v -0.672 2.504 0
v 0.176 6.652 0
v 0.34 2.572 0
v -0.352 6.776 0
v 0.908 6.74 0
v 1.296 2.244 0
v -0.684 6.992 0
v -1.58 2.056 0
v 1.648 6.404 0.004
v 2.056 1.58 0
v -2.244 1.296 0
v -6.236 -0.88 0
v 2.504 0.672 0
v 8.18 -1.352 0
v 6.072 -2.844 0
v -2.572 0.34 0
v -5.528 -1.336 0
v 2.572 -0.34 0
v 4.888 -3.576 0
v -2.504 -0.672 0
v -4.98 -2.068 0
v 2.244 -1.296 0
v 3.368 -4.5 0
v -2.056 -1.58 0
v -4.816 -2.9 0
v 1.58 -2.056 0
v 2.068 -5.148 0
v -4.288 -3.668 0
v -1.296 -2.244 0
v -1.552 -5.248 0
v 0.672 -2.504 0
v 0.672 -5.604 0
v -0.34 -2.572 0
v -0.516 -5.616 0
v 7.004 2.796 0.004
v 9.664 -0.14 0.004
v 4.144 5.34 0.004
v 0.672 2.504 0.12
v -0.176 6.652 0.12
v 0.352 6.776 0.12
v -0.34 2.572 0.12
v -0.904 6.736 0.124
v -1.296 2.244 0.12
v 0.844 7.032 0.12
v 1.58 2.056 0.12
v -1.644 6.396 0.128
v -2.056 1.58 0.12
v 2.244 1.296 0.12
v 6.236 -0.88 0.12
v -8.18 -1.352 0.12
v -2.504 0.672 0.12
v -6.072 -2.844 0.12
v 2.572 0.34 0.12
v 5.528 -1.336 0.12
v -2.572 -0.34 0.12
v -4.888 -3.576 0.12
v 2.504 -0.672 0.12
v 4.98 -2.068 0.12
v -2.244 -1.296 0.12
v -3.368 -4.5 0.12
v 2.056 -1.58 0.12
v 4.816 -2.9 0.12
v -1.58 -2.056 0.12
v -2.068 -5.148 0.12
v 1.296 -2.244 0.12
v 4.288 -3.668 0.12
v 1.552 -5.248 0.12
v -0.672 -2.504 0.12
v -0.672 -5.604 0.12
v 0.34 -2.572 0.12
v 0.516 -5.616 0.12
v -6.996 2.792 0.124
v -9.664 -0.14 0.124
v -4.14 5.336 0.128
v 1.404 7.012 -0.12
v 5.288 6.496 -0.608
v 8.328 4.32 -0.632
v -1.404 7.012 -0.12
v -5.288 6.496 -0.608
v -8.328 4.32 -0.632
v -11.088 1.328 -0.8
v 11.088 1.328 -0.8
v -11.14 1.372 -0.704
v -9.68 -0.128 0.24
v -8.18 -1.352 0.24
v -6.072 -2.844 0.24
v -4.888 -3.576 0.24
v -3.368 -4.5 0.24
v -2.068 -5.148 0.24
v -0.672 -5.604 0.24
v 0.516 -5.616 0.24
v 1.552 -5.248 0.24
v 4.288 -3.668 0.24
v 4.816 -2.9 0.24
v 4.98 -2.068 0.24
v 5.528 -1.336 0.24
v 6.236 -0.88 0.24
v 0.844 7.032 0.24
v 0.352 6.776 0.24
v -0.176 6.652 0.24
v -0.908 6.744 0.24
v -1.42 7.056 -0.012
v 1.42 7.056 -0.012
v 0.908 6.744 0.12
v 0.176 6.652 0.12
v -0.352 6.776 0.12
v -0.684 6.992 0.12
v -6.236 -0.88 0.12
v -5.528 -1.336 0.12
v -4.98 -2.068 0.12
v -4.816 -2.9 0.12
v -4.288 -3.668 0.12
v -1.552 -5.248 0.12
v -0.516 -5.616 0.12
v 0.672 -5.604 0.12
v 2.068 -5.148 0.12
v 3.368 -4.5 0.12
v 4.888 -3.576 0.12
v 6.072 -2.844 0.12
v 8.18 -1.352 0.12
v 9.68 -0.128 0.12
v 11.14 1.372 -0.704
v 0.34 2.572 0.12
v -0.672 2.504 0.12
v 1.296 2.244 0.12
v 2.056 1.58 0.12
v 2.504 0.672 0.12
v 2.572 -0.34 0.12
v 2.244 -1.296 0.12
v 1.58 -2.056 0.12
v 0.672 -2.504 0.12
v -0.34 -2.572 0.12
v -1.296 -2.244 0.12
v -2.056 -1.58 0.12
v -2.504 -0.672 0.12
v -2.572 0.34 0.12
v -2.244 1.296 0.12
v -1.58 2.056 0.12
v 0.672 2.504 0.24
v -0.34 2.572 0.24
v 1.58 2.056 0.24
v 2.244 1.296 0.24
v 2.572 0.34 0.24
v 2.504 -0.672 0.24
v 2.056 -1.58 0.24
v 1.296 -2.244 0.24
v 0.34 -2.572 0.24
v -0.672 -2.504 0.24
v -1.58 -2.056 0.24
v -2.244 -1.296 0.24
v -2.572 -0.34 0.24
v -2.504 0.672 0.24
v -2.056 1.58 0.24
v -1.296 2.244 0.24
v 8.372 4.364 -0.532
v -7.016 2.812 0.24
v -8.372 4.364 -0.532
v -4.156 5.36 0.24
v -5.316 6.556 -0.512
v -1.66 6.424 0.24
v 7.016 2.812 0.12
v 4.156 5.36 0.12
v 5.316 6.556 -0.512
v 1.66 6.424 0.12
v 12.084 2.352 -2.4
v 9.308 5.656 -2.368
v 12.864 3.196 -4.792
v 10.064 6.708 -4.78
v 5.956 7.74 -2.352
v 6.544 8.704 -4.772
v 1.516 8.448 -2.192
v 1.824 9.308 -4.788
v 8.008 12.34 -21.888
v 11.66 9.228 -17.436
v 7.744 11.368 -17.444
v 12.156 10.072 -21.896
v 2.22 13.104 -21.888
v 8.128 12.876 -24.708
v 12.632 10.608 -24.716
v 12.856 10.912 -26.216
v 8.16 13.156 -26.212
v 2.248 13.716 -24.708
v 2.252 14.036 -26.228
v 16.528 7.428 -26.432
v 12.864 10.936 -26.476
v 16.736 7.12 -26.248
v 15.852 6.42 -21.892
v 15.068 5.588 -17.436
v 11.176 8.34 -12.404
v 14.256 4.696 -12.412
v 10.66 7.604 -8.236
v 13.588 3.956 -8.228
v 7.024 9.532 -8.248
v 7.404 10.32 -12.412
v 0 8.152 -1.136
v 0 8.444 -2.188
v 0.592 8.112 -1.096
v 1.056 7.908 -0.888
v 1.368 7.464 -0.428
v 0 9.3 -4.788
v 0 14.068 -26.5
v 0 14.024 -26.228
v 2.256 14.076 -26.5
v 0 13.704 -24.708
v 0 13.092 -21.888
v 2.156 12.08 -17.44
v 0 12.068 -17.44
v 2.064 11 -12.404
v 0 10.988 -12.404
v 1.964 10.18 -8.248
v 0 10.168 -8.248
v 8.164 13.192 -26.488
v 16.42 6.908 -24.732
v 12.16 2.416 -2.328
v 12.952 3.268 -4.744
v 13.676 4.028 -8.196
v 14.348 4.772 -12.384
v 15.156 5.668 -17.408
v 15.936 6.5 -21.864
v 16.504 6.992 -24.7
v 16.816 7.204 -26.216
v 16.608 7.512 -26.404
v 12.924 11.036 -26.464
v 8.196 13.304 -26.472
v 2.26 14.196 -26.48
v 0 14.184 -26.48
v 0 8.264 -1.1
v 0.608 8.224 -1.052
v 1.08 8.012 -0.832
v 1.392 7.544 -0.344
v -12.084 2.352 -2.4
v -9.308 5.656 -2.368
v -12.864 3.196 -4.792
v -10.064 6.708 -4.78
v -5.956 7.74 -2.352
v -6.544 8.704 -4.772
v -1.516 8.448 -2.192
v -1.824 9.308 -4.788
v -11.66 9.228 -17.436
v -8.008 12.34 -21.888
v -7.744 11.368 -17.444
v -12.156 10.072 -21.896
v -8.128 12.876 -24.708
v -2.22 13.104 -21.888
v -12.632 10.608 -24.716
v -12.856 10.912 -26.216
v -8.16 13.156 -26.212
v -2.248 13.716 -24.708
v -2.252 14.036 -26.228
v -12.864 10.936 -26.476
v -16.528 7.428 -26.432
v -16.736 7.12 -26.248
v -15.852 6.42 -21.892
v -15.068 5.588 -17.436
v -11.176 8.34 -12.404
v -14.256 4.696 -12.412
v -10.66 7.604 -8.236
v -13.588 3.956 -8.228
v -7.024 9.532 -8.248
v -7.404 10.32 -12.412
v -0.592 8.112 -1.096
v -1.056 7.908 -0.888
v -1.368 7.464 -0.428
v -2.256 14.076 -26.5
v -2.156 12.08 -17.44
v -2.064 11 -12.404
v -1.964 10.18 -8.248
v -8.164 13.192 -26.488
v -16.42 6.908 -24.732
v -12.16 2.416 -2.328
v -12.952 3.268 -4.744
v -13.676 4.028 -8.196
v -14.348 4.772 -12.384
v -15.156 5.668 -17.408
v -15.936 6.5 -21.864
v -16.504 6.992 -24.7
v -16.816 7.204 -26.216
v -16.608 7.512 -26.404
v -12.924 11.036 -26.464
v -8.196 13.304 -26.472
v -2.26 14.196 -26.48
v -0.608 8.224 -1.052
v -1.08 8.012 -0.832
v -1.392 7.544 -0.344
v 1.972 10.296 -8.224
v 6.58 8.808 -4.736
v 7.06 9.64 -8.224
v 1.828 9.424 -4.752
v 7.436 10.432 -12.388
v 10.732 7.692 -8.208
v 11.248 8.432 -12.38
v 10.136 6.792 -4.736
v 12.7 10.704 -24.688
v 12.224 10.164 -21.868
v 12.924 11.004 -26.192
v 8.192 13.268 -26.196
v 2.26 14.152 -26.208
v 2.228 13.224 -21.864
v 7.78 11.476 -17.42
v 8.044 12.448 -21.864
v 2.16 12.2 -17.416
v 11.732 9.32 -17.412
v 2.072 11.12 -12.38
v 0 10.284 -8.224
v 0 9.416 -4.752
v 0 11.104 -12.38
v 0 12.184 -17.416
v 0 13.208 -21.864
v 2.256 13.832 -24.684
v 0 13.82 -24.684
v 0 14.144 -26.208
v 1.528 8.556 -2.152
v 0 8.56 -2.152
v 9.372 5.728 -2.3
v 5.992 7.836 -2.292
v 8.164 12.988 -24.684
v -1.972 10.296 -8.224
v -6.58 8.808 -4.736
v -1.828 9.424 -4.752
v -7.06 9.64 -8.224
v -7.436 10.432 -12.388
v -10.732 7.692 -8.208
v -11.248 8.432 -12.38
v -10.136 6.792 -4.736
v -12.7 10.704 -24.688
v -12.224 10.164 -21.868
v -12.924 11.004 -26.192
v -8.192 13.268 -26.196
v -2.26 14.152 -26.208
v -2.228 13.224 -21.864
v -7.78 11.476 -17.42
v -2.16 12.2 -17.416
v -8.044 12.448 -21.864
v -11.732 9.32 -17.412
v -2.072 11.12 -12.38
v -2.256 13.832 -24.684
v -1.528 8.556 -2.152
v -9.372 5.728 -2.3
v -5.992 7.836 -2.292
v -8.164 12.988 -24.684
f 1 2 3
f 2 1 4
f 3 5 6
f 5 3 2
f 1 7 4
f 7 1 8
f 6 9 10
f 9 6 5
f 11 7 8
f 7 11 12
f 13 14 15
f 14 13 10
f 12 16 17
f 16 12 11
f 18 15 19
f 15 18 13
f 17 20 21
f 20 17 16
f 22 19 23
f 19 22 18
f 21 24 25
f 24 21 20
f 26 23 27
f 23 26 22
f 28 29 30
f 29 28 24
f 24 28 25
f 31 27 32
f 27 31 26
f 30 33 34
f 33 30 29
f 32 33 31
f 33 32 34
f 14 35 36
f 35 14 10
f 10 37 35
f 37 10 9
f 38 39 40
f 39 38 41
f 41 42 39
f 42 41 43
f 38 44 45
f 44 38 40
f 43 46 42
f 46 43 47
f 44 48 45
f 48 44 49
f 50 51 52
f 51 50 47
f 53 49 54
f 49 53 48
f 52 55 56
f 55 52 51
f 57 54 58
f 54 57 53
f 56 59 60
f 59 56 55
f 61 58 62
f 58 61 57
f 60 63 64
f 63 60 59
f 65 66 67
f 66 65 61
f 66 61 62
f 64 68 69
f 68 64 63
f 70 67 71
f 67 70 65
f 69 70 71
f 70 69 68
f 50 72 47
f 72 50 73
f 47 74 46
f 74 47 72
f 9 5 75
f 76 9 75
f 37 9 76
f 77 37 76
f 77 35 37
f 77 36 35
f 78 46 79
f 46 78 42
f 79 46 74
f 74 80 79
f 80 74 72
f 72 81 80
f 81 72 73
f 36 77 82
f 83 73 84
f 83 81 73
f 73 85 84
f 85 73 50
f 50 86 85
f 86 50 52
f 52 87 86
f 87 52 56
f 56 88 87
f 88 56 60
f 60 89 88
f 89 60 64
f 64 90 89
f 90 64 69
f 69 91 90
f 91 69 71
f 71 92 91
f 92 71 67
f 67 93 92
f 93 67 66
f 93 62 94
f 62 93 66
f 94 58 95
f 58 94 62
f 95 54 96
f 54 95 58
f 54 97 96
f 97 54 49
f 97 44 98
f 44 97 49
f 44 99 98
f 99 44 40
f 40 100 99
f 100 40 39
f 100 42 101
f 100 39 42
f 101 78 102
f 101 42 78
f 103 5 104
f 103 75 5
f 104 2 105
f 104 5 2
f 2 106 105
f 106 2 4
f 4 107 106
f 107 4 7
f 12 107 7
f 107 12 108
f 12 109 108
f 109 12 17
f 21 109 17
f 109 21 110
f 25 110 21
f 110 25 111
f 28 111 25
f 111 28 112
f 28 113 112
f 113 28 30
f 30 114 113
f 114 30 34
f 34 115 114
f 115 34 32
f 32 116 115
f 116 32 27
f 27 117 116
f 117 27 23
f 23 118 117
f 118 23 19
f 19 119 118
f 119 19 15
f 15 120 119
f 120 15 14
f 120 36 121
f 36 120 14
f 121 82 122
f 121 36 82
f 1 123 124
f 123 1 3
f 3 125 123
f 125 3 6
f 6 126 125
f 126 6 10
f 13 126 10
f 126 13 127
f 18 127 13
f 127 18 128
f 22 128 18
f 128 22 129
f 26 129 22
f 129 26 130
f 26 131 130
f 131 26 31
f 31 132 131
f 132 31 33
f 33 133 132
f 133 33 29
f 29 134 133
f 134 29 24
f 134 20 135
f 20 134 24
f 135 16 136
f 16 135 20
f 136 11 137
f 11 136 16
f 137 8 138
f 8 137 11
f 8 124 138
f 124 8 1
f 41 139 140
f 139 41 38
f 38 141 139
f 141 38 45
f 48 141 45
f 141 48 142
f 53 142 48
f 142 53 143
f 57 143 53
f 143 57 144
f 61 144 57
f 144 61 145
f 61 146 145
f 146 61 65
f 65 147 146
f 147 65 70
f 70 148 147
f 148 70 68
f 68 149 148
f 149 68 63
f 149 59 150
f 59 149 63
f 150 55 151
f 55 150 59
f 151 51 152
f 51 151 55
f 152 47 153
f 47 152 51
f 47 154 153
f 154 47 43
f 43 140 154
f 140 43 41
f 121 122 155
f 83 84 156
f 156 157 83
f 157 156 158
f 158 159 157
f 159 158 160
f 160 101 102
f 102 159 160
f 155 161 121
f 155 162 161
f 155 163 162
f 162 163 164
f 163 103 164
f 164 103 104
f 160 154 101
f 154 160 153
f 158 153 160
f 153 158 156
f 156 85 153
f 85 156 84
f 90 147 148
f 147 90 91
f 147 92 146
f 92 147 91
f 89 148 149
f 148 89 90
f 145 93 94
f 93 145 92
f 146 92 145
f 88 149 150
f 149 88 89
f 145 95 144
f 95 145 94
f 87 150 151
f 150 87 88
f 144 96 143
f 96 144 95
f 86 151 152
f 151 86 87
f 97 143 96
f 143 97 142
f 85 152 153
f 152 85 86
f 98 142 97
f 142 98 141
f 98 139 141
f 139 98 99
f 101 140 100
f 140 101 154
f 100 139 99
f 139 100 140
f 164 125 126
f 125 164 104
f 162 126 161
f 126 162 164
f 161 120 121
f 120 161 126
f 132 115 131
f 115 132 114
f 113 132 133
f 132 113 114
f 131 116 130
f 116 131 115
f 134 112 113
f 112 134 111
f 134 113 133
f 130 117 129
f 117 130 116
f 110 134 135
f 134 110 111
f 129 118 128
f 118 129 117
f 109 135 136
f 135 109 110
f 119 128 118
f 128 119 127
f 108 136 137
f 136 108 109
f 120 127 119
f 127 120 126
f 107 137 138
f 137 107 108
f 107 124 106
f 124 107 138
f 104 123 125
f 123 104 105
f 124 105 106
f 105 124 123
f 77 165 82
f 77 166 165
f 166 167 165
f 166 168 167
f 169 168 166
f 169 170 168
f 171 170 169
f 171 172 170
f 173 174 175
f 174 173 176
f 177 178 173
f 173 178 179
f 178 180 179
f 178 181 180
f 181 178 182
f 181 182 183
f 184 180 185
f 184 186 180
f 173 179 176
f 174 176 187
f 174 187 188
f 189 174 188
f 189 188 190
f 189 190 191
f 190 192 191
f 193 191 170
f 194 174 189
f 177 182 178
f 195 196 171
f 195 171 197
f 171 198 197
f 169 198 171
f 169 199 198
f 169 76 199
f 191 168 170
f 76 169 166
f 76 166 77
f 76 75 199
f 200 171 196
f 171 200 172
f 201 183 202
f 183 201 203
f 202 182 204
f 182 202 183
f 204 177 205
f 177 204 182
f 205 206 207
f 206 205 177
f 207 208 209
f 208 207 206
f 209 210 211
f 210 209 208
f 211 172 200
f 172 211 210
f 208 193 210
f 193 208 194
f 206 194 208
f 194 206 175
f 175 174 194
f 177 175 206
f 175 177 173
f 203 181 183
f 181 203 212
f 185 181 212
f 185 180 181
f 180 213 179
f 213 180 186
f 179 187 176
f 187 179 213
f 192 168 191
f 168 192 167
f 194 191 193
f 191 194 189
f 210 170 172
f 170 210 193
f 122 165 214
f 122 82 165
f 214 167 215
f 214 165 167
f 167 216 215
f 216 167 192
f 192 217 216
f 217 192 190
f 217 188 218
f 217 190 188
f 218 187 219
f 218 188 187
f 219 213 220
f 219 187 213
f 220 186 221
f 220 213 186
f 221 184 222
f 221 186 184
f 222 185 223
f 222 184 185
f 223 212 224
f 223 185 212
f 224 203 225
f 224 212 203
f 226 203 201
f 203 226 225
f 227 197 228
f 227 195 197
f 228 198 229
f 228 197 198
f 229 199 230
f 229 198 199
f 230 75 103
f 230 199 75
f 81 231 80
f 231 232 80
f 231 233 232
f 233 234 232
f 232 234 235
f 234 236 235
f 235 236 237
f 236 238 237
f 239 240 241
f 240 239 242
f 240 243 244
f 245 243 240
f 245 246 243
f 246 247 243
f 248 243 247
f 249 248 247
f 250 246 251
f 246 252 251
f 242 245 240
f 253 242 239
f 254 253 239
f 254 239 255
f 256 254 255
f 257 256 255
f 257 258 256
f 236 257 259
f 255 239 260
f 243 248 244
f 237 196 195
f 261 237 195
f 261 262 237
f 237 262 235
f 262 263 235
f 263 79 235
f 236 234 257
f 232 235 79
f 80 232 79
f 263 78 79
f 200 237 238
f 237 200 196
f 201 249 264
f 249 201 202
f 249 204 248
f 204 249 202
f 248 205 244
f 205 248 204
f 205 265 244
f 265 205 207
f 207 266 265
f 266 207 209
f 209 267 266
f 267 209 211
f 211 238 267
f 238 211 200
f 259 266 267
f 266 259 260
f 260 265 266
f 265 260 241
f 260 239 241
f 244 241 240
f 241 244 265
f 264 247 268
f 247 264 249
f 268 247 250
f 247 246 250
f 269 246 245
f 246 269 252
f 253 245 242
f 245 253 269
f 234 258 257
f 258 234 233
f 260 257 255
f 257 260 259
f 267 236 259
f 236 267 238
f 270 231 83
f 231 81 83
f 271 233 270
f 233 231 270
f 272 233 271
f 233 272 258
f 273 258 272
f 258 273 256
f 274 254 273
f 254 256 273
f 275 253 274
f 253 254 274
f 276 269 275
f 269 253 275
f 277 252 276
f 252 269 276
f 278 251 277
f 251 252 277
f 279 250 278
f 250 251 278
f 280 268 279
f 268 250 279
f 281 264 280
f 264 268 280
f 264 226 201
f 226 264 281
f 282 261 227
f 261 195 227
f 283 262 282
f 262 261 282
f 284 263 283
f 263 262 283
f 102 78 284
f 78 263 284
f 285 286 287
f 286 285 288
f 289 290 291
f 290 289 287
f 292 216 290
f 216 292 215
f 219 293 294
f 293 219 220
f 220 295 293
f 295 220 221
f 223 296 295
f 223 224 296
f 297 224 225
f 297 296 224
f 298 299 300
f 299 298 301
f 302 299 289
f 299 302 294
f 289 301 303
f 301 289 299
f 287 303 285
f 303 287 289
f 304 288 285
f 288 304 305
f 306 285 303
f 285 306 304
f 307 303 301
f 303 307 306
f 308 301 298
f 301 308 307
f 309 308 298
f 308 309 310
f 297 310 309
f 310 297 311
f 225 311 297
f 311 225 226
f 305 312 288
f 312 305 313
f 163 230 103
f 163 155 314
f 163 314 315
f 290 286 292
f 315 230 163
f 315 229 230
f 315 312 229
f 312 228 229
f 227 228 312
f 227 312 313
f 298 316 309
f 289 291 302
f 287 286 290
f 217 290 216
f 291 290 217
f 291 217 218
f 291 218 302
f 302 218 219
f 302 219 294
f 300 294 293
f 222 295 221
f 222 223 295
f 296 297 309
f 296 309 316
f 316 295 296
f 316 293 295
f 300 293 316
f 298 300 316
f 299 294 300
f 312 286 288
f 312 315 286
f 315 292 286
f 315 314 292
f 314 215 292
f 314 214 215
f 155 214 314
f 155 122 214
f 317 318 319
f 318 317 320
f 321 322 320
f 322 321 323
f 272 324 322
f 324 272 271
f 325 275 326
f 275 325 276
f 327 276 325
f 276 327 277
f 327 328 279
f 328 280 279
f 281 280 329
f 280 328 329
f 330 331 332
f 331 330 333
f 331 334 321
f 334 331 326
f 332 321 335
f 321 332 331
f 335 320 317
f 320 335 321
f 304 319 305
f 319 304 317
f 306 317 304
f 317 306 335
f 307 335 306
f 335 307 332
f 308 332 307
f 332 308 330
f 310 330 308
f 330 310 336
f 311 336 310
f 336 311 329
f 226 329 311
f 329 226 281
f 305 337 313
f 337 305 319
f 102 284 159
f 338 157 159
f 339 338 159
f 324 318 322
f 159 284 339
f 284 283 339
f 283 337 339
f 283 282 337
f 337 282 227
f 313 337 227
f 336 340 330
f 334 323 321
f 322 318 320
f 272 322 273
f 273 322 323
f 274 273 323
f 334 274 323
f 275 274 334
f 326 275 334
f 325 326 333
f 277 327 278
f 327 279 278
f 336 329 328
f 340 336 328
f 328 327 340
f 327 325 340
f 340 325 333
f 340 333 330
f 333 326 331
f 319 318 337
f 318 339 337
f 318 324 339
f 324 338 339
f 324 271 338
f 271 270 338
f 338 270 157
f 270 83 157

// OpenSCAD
use <../lib.scad>
use <s/50231s01.scad>
use <s/50231s02.scad>
use <s/50231s03.scad>
use <s/50231s04.scad>
function ldraw_lib__50231c01() = [
// 0 Minifig Cape Cloth (Formed)
// 0 Name: 50231c01.dat
// 0 Author: Philippe Hurbain [Philo]
// 0 !LDRAW_ORG Part UPDATE 2019-01
// 0 !LICENSE Licensed under CC BY 4.0 : see CAreadme.txt
// 
// 0 !HELP Place at y = 0 on torso, head at y = -0.6
// 
// 0 BFC CERTIFY CCW
  [0,"BFC","CERTIFY"],
  [0,"BFC","CCW"],
// 
// 0 !CATEGORY Minifig Neckwear
// 0 !KEYWORDS BrickLink 522, Cloak, Drape, Neckwear, Poncho, Rebrickable 50231
// 0 !KEYWORDS Shawl
// 
// 0 !HISTORY 2014-12-04 {LEGO Digital Designer} Original part shape
// 0 !HISTORY 2014-12-04 [Philo] File preparation for LDraw Parts Tracker
// 0 !HISTORY 2014-12-23 [PTadmin] Official Update 2014-02
// 0 !HISTORY 2019-01-26 [cwdee] Update category
// 0 !HISTORY 2019-06-28 [PTadmin] Official Update 2019-01
// 
// 
// 1 16 0 0 0 1 0 0 0 1 0 0 0 1 s\50231s01.dat
  [1,16,0,0,0,1,0,0,0,1,0,0,0,1, ldraw_lib__s__50231s01()],
// 1 16 0 0 0 1 0 0 0 1 0 0 0 1 s\50231s02.dat
  [1,16,0,0,0,1,0,0,0,1,0,0,0,1, ldraw_lib__s__50231s02()],
// 1 16 0 0 0 1 0 0 0 1 0 0 0 1 s\50231s03.dat
  [1,16,0,0,0,1,0,0,0,1,0,0,0,1, ldraw_lib__s__50231s03()],
// 1 16 0 0 0 -1 0 0 0 1 0 0 0 1 s\50231s03.dat
  [1,16,0,0,0,-1,0,0,0,1,0,0,0,1, ldraw_lib__s__50231s03()],
// 1 16 0 0 0 1 0 0 0 1 0 0 0 1 s\50231s04.dat
  [1,16,0,0,0,1,0,0,0,1,0,0,0,1, ldraw_lib__s__50231s04()],
// 1 16 0 0 0 -1 0 0 0 1 0 0 0 1 s\50231s04.dat
  [1,16,0,0,0,-1,0,0,0,1,0,0,0,1, ldraw_lib__s__50231s04()],
];
module ldraw_lib__50231c01(step=0, col=false, unit=2/5, alt=false, line=0.2, solid=!$preview)
    makepoly(ldraw_lib__50231c01(), step=step, col=col, unit=unit, alt=alt, line=line, solid=solid);
ldraw_lib__50231c01(line=0.2);
